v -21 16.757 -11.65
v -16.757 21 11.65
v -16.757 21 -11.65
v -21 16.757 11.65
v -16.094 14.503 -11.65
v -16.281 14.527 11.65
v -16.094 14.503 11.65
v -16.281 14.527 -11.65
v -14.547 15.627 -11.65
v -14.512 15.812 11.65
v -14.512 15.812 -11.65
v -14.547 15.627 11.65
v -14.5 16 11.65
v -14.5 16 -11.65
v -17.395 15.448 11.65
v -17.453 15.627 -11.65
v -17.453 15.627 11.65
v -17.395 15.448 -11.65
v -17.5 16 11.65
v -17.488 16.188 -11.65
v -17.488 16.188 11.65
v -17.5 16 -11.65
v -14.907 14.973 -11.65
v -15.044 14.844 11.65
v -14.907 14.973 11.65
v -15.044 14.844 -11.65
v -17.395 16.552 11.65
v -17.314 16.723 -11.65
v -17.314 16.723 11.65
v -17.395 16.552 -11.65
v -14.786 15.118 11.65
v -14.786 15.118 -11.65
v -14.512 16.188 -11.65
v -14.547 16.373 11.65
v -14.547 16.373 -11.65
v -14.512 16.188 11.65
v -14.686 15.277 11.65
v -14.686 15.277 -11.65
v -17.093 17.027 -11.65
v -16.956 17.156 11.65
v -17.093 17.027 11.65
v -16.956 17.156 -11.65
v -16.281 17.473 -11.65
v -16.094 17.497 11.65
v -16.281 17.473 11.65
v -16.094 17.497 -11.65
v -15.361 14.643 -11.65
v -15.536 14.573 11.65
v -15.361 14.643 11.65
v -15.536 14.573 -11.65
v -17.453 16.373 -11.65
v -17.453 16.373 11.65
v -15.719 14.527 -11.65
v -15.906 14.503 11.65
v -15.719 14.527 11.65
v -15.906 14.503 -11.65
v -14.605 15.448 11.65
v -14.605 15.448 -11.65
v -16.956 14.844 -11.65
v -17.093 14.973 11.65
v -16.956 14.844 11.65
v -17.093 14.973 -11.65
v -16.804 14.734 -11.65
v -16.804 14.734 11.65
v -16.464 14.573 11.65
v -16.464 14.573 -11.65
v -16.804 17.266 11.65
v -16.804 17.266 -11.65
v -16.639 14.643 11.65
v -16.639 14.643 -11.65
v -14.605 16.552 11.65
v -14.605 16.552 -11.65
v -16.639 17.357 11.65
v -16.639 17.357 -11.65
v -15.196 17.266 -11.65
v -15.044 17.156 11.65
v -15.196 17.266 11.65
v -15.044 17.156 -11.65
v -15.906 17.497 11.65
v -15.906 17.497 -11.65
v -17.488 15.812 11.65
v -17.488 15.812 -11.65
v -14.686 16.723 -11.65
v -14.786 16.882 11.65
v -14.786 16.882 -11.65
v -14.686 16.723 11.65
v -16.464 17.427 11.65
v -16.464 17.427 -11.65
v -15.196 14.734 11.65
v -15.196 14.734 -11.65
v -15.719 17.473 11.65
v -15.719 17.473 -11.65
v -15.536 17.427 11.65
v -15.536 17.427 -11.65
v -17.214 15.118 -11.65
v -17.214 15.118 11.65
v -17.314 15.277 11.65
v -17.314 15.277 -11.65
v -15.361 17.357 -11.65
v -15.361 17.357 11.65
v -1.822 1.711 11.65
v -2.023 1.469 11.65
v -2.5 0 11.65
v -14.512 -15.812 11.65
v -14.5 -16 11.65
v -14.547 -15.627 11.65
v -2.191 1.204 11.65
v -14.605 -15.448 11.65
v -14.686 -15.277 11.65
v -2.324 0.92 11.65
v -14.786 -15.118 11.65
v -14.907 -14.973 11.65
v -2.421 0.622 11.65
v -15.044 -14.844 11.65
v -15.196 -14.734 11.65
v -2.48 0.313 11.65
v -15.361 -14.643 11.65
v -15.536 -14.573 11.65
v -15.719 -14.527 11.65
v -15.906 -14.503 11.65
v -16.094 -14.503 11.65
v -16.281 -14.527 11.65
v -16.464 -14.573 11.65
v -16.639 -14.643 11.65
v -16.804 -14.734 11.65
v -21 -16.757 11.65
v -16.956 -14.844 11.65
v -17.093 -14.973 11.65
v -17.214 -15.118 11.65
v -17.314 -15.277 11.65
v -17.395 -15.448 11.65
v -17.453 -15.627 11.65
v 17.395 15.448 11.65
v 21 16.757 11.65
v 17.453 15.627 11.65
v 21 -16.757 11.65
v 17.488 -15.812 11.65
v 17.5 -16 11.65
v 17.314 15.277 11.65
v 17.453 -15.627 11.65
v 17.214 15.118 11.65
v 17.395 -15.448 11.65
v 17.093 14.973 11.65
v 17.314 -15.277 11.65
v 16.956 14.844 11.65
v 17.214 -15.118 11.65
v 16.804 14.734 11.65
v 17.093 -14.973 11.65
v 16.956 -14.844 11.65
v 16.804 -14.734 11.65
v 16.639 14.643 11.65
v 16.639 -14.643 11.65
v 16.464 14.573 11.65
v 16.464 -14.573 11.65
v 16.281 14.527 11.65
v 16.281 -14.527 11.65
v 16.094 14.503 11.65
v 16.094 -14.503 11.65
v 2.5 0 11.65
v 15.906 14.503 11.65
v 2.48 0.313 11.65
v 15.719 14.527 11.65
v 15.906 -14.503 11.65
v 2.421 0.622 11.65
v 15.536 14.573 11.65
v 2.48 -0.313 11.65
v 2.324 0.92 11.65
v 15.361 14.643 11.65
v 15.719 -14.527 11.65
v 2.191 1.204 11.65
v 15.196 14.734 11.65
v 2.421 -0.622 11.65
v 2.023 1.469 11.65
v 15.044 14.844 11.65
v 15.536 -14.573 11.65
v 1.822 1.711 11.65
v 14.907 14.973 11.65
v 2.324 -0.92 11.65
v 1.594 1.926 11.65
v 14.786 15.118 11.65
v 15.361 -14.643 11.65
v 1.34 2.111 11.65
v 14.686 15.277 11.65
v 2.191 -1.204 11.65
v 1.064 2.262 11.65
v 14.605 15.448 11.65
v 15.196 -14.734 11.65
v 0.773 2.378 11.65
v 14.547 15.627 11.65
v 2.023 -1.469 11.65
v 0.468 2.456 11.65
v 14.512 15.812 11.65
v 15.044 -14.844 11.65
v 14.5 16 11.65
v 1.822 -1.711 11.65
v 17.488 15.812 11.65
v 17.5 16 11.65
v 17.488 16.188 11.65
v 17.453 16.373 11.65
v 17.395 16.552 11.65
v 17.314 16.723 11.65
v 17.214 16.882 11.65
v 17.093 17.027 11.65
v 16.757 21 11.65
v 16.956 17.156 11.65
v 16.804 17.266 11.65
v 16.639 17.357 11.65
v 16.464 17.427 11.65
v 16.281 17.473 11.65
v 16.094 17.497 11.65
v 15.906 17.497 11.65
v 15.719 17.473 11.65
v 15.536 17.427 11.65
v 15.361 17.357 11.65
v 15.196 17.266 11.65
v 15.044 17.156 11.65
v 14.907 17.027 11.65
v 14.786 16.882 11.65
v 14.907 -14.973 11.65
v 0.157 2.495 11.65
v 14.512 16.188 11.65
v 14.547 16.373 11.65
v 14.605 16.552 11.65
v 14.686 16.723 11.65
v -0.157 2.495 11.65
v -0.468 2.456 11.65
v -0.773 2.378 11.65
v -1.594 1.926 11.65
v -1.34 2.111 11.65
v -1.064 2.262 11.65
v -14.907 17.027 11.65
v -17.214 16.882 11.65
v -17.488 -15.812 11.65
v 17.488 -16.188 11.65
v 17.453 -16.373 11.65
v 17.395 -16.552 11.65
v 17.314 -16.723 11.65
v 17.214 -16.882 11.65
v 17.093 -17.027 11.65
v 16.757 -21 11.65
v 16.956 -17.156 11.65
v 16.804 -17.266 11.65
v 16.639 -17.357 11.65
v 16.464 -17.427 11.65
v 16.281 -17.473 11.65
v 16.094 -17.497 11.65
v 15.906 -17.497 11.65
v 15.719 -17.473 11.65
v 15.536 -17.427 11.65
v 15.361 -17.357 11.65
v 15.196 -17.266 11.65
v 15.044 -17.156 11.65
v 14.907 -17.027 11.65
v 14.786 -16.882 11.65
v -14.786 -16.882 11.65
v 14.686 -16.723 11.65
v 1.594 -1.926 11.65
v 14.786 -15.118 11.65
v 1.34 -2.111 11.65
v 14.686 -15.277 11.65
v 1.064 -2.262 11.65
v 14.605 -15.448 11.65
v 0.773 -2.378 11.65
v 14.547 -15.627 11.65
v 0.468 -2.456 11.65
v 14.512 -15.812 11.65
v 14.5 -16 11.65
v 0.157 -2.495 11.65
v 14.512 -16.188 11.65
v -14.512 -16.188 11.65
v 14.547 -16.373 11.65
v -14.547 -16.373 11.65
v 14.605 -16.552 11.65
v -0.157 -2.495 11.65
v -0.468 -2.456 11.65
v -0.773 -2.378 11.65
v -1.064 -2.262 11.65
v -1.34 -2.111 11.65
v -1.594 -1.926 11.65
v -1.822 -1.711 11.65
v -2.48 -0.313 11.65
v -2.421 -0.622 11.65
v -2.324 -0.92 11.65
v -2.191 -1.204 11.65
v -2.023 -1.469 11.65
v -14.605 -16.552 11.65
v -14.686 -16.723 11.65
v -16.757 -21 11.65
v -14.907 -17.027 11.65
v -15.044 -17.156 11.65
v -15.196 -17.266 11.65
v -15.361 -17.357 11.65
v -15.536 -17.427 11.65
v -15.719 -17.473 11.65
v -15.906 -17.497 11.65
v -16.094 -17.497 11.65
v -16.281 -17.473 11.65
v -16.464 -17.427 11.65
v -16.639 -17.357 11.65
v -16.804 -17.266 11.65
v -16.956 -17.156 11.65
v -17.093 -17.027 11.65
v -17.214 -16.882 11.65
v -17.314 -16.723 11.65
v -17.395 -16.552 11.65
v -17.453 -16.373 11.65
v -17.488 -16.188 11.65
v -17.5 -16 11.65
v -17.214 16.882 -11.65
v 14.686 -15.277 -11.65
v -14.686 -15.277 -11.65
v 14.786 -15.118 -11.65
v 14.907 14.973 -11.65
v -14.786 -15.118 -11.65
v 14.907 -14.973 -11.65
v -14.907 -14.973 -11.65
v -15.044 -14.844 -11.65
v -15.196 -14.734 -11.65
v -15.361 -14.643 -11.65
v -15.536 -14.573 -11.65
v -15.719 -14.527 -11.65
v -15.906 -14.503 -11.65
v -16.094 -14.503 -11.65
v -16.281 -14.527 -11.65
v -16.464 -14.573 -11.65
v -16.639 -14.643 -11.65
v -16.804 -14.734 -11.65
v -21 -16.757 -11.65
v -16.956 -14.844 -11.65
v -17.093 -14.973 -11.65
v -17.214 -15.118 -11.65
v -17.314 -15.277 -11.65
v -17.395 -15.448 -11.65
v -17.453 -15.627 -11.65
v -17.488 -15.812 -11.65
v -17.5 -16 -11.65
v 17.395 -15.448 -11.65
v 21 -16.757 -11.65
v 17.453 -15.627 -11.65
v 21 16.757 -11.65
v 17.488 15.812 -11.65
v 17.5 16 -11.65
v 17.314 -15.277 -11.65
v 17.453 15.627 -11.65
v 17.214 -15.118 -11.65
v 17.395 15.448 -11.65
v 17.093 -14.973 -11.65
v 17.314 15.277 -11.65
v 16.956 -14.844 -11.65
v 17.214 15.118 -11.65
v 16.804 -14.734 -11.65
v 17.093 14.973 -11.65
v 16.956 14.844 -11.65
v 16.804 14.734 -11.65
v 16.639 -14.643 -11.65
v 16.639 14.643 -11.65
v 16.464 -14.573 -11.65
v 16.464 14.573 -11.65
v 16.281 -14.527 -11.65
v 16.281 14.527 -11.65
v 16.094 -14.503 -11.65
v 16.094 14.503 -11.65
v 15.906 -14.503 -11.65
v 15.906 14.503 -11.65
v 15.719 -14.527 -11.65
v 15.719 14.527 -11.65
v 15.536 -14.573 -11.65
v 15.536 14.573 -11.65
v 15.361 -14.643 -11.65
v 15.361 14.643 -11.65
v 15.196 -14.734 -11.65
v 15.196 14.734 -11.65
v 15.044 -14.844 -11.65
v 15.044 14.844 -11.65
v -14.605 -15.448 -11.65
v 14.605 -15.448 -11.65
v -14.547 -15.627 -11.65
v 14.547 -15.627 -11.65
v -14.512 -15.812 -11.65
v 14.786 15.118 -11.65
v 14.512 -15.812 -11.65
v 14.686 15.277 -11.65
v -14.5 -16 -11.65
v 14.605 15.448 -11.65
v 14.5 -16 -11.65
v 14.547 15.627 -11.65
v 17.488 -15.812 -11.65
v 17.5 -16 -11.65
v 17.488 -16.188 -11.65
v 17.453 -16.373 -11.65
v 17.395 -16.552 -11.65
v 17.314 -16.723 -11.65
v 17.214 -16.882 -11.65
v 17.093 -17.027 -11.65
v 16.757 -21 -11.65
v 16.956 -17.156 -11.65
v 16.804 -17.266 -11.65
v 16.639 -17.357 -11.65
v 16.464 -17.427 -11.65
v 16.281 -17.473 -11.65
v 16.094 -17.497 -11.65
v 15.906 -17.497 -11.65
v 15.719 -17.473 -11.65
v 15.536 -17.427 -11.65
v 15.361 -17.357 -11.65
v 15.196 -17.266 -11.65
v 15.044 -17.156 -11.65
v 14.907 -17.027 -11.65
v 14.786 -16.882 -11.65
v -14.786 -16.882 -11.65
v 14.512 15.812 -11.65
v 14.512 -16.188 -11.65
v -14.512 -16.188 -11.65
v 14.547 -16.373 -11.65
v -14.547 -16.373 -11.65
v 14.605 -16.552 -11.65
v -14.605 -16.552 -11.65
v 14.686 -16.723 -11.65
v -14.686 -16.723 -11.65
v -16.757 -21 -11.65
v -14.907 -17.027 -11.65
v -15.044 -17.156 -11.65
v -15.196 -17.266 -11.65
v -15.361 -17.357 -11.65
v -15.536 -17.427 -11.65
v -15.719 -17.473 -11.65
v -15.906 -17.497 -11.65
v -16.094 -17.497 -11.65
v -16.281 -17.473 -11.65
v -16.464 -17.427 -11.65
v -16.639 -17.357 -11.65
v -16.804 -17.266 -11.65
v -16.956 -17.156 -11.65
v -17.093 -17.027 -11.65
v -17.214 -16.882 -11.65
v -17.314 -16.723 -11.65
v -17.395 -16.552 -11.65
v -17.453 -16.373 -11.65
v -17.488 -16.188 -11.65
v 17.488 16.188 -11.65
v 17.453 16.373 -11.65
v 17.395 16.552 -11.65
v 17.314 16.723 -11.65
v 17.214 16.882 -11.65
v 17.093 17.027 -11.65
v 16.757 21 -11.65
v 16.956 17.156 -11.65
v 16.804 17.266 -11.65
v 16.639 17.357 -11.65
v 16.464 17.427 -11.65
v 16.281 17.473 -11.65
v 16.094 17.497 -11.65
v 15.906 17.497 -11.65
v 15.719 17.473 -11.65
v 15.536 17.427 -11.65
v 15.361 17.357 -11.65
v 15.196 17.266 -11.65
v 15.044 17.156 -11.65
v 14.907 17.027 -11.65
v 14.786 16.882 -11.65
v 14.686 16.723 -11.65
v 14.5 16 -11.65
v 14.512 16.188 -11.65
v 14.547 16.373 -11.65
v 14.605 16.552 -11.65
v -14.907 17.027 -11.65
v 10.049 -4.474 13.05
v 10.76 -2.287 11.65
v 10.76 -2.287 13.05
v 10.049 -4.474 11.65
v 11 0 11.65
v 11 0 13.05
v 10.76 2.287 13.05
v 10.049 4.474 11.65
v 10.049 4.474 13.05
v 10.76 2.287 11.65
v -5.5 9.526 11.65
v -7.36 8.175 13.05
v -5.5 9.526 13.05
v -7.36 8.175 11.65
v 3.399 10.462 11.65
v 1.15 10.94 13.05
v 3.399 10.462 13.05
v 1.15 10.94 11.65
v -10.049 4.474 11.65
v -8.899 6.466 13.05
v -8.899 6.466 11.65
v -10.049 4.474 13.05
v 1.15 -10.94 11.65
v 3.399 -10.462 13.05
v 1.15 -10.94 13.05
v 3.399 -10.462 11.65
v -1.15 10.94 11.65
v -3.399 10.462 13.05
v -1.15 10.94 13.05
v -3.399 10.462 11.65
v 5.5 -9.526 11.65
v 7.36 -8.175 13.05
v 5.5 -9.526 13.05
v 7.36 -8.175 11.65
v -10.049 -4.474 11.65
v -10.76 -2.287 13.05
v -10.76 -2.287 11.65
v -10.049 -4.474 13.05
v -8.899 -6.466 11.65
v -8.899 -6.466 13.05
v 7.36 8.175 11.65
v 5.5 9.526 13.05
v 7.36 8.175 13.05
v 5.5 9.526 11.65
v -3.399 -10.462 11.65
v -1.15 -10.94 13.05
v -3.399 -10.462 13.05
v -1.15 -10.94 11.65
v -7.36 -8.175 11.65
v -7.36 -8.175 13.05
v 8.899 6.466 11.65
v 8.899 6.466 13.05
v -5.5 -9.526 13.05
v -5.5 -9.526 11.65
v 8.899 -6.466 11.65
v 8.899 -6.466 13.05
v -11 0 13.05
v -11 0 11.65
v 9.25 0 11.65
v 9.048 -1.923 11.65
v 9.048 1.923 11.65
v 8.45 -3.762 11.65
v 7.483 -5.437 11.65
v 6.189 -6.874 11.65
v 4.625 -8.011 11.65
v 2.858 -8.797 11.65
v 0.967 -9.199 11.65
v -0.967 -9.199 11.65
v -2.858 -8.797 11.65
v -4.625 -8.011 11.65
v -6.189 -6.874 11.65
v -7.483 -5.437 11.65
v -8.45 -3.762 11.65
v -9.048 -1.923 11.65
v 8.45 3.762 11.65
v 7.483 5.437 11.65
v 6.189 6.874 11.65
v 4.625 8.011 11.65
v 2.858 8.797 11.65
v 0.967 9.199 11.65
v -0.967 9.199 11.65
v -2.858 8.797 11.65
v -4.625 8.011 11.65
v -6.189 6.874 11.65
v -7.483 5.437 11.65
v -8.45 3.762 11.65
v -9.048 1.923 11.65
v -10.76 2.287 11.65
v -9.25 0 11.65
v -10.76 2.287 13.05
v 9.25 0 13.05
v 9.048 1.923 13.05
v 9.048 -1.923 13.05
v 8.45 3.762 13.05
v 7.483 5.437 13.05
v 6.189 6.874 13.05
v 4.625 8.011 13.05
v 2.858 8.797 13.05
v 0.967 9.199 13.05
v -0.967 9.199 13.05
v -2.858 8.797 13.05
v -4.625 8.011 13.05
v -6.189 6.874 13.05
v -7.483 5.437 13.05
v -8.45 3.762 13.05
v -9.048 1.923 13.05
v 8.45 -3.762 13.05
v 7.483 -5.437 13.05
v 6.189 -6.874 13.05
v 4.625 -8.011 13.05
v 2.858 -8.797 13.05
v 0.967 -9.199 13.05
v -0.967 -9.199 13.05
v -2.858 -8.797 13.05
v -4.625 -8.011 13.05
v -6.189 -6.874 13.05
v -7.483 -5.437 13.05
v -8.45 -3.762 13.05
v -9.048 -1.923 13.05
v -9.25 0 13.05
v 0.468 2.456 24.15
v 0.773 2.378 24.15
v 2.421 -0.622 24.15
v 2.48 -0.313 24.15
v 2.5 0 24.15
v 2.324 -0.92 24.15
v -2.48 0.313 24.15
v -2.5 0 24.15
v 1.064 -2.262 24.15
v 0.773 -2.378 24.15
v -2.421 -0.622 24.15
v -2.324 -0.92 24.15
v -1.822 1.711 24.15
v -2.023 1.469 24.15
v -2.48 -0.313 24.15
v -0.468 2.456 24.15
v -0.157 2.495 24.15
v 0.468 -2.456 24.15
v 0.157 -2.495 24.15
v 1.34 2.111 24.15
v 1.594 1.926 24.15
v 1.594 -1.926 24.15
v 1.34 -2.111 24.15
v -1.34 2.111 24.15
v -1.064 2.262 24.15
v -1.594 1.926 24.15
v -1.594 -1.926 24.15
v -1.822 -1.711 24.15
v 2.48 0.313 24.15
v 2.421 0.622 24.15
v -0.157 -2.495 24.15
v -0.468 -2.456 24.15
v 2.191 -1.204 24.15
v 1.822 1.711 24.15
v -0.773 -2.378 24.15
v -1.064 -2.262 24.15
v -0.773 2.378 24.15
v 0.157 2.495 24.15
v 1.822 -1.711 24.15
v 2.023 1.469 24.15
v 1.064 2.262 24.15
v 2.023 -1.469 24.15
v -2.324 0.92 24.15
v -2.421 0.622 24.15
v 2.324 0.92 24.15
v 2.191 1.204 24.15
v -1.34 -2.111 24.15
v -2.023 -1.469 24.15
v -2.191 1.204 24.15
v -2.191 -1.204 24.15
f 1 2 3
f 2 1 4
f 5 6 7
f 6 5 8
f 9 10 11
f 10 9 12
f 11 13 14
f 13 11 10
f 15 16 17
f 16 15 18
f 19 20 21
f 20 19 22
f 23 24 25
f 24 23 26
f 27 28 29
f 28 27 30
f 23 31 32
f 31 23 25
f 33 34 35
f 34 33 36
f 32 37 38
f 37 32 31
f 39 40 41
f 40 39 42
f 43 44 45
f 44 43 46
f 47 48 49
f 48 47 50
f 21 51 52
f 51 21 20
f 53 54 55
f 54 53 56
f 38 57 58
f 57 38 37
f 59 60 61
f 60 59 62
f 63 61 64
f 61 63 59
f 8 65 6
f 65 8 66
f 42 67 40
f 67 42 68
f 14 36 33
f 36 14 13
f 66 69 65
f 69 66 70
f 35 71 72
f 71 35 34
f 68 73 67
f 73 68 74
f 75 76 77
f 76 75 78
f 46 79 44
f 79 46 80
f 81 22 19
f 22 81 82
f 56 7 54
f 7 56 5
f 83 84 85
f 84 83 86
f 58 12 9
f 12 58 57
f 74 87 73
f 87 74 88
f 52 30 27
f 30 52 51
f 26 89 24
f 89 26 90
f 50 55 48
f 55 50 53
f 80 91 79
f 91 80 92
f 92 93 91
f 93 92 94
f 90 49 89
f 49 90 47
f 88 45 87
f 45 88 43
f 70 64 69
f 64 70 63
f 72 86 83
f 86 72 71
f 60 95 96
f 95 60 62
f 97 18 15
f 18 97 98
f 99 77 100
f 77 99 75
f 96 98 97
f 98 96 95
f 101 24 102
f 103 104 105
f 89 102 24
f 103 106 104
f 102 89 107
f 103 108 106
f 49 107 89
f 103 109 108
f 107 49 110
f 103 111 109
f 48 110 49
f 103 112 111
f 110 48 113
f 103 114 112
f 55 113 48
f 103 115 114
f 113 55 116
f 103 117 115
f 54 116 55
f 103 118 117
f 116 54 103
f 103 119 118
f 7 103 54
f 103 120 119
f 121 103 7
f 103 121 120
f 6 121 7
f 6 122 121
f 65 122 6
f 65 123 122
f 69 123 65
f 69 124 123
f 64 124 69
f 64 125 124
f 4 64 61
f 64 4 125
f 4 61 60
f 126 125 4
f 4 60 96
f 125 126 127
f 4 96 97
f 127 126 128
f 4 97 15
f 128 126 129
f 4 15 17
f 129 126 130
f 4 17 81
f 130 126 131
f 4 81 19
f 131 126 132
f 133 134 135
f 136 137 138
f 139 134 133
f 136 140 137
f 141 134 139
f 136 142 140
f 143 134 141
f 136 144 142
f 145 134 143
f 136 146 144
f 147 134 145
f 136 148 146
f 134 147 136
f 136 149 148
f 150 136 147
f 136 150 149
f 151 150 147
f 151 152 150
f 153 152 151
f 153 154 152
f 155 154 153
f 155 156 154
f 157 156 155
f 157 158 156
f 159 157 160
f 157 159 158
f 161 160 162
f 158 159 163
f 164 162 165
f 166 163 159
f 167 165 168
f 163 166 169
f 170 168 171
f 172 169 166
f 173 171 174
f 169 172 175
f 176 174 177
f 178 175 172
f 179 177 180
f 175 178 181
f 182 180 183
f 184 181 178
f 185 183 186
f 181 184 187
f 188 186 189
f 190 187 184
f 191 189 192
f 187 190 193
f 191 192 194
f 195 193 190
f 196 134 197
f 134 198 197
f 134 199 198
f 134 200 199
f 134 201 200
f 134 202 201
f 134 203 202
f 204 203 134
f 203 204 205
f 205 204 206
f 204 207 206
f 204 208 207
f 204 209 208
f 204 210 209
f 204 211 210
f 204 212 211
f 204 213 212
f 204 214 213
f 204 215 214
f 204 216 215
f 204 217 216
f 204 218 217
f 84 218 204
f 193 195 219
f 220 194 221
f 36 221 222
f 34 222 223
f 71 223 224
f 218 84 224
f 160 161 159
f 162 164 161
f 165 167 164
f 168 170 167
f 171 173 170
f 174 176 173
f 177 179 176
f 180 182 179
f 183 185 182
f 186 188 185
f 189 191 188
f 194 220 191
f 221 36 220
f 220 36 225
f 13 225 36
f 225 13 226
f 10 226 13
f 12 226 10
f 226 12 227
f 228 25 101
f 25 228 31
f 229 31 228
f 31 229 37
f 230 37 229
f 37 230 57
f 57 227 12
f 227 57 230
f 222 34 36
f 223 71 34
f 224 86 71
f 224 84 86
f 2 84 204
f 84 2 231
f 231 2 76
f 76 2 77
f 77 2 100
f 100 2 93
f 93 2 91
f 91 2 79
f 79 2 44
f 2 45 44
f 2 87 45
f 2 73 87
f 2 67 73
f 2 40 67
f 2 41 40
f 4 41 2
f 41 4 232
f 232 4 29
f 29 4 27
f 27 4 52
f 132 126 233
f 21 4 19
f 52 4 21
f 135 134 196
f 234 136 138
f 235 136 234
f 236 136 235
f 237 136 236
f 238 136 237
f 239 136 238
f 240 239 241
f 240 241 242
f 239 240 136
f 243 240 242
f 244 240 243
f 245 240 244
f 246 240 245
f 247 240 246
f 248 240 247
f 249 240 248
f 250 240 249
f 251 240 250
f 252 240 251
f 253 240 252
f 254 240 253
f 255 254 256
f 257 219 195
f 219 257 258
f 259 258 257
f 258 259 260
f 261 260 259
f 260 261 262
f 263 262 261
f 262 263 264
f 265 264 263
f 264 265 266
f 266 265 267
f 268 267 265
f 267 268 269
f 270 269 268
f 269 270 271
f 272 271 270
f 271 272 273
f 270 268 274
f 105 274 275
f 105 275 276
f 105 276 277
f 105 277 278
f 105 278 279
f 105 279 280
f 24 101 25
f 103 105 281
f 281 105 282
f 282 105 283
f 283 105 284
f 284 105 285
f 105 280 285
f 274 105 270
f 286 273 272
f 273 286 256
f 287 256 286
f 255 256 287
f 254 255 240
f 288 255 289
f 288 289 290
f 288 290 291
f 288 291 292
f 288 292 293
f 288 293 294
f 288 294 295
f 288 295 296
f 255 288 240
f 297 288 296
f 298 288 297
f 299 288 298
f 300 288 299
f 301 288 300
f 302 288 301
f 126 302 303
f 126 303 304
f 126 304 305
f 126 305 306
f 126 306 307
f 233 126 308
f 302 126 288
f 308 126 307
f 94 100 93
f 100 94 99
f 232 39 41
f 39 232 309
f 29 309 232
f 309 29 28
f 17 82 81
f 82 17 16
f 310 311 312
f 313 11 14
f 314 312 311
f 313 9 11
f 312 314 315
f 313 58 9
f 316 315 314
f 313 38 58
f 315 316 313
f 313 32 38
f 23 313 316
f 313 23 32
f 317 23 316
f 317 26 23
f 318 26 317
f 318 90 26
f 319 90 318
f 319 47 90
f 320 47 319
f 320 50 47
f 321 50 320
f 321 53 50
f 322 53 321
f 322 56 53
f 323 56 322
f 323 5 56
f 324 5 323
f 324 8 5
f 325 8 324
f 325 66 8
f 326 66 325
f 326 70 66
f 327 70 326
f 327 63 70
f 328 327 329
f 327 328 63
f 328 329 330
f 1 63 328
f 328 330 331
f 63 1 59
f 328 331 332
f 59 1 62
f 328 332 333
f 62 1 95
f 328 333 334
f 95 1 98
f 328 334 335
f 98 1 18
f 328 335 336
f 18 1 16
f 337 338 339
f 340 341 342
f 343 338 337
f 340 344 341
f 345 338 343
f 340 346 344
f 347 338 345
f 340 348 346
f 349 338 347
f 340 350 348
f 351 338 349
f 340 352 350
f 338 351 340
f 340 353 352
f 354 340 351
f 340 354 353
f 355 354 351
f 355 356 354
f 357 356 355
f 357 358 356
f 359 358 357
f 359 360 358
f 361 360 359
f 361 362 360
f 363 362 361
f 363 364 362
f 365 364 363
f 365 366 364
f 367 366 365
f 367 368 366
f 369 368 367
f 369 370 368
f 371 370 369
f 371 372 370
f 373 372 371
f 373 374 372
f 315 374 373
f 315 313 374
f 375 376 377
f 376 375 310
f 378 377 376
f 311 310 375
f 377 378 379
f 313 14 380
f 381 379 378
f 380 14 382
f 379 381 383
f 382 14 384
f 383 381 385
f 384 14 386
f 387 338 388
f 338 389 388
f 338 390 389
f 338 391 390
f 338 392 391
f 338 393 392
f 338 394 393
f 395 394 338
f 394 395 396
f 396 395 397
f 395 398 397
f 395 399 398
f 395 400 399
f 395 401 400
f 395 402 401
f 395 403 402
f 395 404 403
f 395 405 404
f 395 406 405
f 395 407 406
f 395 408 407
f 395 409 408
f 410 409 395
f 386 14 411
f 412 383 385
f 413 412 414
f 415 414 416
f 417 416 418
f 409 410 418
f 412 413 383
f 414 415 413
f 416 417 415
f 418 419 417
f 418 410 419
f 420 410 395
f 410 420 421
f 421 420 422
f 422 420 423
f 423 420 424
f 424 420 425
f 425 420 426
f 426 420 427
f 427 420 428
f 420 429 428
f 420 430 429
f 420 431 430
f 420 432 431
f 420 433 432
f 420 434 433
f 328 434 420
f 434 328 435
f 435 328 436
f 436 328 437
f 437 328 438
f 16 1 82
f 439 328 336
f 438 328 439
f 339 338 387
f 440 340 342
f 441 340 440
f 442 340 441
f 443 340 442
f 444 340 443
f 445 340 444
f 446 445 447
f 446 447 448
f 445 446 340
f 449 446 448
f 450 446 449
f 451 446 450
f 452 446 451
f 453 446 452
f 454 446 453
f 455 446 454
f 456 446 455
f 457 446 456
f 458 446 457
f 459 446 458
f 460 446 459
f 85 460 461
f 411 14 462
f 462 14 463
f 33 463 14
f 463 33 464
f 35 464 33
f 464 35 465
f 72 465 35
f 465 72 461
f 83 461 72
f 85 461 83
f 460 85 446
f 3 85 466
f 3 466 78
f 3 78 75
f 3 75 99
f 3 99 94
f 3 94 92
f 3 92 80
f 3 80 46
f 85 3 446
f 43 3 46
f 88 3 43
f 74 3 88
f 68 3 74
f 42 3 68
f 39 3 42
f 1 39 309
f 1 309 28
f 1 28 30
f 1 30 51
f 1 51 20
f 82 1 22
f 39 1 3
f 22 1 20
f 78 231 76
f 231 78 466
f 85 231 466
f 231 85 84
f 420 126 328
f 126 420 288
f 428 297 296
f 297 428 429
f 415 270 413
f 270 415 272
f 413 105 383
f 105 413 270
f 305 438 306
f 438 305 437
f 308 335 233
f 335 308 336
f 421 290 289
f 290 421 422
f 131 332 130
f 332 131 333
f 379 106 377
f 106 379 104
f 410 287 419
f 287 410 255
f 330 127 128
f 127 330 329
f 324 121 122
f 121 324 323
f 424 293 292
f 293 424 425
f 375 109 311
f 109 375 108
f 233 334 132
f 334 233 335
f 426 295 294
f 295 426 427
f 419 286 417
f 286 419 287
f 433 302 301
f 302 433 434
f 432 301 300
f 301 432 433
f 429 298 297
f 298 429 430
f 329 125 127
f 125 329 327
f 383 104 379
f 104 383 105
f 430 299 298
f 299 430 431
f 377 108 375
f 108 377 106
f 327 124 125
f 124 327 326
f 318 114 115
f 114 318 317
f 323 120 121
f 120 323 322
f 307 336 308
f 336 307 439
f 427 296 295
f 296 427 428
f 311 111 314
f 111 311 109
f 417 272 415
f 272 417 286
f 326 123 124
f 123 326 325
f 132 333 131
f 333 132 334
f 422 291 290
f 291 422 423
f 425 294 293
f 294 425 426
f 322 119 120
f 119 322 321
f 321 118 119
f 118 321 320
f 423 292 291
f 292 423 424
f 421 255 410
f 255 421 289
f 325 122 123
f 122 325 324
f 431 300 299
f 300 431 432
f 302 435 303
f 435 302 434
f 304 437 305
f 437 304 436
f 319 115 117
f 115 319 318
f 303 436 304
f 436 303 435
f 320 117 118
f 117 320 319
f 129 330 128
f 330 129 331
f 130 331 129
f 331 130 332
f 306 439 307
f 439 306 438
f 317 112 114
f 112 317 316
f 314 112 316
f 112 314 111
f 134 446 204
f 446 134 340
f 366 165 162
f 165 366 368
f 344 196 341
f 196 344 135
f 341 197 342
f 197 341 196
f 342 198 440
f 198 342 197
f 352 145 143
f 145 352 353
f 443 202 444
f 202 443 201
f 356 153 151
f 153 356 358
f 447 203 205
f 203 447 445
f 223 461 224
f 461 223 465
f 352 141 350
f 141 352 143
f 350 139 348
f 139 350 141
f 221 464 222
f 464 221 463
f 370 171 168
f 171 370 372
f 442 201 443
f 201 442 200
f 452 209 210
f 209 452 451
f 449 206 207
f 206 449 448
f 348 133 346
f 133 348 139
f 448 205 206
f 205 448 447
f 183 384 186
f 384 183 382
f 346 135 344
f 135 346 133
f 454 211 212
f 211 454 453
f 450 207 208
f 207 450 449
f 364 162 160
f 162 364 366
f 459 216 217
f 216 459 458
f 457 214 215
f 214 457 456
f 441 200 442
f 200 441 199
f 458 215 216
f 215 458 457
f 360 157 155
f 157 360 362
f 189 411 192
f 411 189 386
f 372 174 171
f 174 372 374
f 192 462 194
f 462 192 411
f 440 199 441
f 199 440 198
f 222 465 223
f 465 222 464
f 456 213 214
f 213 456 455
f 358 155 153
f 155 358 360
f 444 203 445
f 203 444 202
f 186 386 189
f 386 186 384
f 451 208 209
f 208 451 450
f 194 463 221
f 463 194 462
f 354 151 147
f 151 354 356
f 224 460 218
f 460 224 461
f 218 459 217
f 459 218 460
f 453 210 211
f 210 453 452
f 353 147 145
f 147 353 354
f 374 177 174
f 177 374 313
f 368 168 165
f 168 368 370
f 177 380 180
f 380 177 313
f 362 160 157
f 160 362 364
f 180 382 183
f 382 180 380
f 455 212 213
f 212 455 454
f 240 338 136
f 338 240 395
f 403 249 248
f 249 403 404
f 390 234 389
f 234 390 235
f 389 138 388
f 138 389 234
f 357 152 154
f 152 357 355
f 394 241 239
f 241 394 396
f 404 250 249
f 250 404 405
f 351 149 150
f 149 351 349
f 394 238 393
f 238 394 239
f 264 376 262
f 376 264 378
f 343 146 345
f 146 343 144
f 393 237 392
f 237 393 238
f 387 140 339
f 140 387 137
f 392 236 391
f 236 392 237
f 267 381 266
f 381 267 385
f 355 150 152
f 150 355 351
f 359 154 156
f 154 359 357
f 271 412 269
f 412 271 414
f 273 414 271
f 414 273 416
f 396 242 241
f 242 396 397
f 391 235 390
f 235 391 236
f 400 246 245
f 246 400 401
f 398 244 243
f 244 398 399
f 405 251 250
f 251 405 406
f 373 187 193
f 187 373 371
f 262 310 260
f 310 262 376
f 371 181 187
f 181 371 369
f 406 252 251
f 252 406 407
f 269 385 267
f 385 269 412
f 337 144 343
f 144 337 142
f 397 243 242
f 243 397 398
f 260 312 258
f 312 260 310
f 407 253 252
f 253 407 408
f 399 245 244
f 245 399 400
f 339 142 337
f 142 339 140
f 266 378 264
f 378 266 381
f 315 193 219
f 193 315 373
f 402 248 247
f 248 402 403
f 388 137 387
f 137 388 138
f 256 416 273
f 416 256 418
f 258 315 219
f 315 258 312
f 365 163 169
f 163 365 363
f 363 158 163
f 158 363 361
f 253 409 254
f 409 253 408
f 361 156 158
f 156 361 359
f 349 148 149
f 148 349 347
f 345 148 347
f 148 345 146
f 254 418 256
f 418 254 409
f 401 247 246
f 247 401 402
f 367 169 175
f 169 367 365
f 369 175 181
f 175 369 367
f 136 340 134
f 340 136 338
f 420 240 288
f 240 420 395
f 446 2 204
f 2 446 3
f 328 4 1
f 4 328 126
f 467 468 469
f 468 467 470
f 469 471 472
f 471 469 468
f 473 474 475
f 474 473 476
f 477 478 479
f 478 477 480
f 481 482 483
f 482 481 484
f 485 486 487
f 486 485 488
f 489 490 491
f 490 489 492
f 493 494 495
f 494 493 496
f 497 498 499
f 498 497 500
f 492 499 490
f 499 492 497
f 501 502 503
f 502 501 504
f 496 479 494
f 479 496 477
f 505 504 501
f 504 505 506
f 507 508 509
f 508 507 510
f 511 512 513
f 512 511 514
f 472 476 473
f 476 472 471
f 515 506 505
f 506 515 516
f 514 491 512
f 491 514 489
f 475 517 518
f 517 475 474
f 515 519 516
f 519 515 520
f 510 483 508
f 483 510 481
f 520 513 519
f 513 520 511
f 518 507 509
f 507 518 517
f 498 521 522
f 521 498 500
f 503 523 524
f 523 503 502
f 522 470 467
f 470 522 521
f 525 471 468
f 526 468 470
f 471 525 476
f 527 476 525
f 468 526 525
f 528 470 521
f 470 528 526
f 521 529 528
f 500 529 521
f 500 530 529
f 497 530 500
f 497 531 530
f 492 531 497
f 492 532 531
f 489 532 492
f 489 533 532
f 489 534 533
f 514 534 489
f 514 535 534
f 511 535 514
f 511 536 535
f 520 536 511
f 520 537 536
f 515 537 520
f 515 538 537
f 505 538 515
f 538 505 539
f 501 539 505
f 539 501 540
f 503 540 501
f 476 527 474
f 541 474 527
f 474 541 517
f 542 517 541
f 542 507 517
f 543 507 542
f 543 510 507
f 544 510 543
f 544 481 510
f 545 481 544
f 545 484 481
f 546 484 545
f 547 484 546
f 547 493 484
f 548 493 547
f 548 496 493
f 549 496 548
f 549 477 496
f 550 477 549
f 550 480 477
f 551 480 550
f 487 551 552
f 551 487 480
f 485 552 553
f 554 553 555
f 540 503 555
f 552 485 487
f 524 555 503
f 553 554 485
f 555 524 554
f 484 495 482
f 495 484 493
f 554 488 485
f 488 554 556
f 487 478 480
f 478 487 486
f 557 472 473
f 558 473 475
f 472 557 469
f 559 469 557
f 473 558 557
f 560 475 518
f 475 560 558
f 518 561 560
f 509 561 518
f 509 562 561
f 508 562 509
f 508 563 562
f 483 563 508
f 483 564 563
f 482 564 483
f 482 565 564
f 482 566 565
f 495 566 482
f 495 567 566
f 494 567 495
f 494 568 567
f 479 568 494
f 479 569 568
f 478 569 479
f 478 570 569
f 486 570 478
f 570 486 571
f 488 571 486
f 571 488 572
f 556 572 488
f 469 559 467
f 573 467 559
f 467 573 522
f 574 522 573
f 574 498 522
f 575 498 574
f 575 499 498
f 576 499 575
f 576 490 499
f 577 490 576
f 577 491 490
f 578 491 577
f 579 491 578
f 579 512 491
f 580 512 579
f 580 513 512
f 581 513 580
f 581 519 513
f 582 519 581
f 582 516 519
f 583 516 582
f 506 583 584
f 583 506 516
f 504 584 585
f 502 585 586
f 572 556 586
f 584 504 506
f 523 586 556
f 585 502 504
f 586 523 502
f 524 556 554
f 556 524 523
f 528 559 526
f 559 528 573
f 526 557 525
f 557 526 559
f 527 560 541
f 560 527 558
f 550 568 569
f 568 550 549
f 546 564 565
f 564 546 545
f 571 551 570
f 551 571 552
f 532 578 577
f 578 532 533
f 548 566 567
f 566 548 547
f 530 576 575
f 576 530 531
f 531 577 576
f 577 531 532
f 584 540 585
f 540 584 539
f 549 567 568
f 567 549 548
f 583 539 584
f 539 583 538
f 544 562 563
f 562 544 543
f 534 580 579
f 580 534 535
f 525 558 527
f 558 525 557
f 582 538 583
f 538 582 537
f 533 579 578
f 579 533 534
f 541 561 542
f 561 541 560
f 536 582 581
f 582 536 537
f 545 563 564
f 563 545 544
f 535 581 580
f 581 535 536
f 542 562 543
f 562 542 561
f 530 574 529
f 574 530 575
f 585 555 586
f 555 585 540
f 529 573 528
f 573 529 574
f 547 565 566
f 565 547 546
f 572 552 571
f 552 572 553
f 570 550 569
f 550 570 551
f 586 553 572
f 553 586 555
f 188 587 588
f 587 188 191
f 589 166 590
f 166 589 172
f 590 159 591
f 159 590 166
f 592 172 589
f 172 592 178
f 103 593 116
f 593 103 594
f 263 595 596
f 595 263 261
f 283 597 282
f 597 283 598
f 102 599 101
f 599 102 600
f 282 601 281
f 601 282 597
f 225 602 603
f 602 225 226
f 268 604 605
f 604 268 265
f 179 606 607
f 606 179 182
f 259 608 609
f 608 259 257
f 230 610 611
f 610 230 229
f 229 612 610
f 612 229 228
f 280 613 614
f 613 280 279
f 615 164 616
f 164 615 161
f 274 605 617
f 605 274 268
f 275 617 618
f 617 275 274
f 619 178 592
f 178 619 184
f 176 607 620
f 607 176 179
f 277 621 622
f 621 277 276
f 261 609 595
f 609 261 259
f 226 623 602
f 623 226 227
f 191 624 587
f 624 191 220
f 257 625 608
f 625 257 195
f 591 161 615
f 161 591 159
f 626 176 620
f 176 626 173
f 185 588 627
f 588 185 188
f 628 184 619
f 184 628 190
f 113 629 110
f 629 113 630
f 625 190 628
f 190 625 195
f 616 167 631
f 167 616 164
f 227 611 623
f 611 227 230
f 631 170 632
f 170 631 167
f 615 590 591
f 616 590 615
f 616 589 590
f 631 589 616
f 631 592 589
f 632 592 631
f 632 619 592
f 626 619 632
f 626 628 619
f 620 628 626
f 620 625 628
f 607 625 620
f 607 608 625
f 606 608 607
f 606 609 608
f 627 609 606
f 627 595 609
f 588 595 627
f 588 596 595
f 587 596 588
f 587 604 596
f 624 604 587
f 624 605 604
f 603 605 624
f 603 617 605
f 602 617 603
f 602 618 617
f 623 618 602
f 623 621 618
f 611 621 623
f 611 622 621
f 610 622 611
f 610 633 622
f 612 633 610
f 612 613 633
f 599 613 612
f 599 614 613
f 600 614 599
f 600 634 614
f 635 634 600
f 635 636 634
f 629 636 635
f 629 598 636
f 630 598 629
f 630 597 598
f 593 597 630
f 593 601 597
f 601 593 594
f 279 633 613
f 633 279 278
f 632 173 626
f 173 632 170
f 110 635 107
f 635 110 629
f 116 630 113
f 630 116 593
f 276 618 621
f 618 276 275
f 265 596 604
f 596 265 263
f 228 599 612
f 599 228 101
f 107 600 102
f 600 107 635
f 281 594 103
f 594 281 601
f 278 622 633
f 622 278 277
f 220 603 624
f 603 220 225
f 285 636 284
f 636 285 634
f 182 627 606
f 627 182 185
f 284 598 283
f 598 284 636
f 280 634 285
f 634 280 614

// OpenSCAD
    //cube([42,42,23.3],center=true);
    // Parameters
length = 42;  // Length of the stepper motor
width = 42;  // Width of the stepper motor
height = 23.3;   // Height of the stepper motor
cut_depth = 3; // Size of the angled cuts
screws_holes_diameter = 3;
screws_holes_distance_side = 32;


module inner_circle_and_shaft()
{

    outer_diameter = 22;
    inner_diameter = outer_diameter - 3.5;
    ic_height = 1.4;
    translate([0,(height+ic_height)/2,0])
    {
        rotate([90,0,0])
        {
            difference()
            {
                cylinder(h=ic_height, d=outer_diameter, center=true);
                cylinder(h=ic_height, d=inner_diameter, center=true);
            }
        }
    }
    
    shaft_diameter = 5;
    shaft_height = 25;
    translate([0,(height+shaft_height)/2,0])
    rotate([90,0,0])
    cylinder(h=shaft_height,d=shaft_diameter,$fn=50);
}



// Function to create an angled cut
module angled_cut()
{
    rotate([0, 45, 0])
    translate([-cut_depth, -height/2, -cut_depth])
    cube([cut_depth * 2, height, cut_depth * 2]);
}



rotate([90,0,0])
union()
{
    // Main model
    color("black")
    difference() 
    {
        // Create the main cuboid
        cube([length, height, width], center=true);
        for (x = [-1, 1]) 
        {
            for (y = [-1, 1])    
            {
                for (z = [-1, 1])
                {
                    // corners angled cuts 
                    translate([x * length/2, y * height/2, z * width/2]) 
                    {
                          angled_cut();
                    }
                    
                    // screws holes
                    translate([x * screws_holes_distance_side/2, 0, z* screws_holes_distance_side/2])
                    {
                        rotate([90,0,0])
                        cylinder(h=height, d=screws_holes_diameter, center=true, $fn=50);
                    }
                }
            }
        }
    }

    color("gray")
    inner_circle_and_shaft();
}
